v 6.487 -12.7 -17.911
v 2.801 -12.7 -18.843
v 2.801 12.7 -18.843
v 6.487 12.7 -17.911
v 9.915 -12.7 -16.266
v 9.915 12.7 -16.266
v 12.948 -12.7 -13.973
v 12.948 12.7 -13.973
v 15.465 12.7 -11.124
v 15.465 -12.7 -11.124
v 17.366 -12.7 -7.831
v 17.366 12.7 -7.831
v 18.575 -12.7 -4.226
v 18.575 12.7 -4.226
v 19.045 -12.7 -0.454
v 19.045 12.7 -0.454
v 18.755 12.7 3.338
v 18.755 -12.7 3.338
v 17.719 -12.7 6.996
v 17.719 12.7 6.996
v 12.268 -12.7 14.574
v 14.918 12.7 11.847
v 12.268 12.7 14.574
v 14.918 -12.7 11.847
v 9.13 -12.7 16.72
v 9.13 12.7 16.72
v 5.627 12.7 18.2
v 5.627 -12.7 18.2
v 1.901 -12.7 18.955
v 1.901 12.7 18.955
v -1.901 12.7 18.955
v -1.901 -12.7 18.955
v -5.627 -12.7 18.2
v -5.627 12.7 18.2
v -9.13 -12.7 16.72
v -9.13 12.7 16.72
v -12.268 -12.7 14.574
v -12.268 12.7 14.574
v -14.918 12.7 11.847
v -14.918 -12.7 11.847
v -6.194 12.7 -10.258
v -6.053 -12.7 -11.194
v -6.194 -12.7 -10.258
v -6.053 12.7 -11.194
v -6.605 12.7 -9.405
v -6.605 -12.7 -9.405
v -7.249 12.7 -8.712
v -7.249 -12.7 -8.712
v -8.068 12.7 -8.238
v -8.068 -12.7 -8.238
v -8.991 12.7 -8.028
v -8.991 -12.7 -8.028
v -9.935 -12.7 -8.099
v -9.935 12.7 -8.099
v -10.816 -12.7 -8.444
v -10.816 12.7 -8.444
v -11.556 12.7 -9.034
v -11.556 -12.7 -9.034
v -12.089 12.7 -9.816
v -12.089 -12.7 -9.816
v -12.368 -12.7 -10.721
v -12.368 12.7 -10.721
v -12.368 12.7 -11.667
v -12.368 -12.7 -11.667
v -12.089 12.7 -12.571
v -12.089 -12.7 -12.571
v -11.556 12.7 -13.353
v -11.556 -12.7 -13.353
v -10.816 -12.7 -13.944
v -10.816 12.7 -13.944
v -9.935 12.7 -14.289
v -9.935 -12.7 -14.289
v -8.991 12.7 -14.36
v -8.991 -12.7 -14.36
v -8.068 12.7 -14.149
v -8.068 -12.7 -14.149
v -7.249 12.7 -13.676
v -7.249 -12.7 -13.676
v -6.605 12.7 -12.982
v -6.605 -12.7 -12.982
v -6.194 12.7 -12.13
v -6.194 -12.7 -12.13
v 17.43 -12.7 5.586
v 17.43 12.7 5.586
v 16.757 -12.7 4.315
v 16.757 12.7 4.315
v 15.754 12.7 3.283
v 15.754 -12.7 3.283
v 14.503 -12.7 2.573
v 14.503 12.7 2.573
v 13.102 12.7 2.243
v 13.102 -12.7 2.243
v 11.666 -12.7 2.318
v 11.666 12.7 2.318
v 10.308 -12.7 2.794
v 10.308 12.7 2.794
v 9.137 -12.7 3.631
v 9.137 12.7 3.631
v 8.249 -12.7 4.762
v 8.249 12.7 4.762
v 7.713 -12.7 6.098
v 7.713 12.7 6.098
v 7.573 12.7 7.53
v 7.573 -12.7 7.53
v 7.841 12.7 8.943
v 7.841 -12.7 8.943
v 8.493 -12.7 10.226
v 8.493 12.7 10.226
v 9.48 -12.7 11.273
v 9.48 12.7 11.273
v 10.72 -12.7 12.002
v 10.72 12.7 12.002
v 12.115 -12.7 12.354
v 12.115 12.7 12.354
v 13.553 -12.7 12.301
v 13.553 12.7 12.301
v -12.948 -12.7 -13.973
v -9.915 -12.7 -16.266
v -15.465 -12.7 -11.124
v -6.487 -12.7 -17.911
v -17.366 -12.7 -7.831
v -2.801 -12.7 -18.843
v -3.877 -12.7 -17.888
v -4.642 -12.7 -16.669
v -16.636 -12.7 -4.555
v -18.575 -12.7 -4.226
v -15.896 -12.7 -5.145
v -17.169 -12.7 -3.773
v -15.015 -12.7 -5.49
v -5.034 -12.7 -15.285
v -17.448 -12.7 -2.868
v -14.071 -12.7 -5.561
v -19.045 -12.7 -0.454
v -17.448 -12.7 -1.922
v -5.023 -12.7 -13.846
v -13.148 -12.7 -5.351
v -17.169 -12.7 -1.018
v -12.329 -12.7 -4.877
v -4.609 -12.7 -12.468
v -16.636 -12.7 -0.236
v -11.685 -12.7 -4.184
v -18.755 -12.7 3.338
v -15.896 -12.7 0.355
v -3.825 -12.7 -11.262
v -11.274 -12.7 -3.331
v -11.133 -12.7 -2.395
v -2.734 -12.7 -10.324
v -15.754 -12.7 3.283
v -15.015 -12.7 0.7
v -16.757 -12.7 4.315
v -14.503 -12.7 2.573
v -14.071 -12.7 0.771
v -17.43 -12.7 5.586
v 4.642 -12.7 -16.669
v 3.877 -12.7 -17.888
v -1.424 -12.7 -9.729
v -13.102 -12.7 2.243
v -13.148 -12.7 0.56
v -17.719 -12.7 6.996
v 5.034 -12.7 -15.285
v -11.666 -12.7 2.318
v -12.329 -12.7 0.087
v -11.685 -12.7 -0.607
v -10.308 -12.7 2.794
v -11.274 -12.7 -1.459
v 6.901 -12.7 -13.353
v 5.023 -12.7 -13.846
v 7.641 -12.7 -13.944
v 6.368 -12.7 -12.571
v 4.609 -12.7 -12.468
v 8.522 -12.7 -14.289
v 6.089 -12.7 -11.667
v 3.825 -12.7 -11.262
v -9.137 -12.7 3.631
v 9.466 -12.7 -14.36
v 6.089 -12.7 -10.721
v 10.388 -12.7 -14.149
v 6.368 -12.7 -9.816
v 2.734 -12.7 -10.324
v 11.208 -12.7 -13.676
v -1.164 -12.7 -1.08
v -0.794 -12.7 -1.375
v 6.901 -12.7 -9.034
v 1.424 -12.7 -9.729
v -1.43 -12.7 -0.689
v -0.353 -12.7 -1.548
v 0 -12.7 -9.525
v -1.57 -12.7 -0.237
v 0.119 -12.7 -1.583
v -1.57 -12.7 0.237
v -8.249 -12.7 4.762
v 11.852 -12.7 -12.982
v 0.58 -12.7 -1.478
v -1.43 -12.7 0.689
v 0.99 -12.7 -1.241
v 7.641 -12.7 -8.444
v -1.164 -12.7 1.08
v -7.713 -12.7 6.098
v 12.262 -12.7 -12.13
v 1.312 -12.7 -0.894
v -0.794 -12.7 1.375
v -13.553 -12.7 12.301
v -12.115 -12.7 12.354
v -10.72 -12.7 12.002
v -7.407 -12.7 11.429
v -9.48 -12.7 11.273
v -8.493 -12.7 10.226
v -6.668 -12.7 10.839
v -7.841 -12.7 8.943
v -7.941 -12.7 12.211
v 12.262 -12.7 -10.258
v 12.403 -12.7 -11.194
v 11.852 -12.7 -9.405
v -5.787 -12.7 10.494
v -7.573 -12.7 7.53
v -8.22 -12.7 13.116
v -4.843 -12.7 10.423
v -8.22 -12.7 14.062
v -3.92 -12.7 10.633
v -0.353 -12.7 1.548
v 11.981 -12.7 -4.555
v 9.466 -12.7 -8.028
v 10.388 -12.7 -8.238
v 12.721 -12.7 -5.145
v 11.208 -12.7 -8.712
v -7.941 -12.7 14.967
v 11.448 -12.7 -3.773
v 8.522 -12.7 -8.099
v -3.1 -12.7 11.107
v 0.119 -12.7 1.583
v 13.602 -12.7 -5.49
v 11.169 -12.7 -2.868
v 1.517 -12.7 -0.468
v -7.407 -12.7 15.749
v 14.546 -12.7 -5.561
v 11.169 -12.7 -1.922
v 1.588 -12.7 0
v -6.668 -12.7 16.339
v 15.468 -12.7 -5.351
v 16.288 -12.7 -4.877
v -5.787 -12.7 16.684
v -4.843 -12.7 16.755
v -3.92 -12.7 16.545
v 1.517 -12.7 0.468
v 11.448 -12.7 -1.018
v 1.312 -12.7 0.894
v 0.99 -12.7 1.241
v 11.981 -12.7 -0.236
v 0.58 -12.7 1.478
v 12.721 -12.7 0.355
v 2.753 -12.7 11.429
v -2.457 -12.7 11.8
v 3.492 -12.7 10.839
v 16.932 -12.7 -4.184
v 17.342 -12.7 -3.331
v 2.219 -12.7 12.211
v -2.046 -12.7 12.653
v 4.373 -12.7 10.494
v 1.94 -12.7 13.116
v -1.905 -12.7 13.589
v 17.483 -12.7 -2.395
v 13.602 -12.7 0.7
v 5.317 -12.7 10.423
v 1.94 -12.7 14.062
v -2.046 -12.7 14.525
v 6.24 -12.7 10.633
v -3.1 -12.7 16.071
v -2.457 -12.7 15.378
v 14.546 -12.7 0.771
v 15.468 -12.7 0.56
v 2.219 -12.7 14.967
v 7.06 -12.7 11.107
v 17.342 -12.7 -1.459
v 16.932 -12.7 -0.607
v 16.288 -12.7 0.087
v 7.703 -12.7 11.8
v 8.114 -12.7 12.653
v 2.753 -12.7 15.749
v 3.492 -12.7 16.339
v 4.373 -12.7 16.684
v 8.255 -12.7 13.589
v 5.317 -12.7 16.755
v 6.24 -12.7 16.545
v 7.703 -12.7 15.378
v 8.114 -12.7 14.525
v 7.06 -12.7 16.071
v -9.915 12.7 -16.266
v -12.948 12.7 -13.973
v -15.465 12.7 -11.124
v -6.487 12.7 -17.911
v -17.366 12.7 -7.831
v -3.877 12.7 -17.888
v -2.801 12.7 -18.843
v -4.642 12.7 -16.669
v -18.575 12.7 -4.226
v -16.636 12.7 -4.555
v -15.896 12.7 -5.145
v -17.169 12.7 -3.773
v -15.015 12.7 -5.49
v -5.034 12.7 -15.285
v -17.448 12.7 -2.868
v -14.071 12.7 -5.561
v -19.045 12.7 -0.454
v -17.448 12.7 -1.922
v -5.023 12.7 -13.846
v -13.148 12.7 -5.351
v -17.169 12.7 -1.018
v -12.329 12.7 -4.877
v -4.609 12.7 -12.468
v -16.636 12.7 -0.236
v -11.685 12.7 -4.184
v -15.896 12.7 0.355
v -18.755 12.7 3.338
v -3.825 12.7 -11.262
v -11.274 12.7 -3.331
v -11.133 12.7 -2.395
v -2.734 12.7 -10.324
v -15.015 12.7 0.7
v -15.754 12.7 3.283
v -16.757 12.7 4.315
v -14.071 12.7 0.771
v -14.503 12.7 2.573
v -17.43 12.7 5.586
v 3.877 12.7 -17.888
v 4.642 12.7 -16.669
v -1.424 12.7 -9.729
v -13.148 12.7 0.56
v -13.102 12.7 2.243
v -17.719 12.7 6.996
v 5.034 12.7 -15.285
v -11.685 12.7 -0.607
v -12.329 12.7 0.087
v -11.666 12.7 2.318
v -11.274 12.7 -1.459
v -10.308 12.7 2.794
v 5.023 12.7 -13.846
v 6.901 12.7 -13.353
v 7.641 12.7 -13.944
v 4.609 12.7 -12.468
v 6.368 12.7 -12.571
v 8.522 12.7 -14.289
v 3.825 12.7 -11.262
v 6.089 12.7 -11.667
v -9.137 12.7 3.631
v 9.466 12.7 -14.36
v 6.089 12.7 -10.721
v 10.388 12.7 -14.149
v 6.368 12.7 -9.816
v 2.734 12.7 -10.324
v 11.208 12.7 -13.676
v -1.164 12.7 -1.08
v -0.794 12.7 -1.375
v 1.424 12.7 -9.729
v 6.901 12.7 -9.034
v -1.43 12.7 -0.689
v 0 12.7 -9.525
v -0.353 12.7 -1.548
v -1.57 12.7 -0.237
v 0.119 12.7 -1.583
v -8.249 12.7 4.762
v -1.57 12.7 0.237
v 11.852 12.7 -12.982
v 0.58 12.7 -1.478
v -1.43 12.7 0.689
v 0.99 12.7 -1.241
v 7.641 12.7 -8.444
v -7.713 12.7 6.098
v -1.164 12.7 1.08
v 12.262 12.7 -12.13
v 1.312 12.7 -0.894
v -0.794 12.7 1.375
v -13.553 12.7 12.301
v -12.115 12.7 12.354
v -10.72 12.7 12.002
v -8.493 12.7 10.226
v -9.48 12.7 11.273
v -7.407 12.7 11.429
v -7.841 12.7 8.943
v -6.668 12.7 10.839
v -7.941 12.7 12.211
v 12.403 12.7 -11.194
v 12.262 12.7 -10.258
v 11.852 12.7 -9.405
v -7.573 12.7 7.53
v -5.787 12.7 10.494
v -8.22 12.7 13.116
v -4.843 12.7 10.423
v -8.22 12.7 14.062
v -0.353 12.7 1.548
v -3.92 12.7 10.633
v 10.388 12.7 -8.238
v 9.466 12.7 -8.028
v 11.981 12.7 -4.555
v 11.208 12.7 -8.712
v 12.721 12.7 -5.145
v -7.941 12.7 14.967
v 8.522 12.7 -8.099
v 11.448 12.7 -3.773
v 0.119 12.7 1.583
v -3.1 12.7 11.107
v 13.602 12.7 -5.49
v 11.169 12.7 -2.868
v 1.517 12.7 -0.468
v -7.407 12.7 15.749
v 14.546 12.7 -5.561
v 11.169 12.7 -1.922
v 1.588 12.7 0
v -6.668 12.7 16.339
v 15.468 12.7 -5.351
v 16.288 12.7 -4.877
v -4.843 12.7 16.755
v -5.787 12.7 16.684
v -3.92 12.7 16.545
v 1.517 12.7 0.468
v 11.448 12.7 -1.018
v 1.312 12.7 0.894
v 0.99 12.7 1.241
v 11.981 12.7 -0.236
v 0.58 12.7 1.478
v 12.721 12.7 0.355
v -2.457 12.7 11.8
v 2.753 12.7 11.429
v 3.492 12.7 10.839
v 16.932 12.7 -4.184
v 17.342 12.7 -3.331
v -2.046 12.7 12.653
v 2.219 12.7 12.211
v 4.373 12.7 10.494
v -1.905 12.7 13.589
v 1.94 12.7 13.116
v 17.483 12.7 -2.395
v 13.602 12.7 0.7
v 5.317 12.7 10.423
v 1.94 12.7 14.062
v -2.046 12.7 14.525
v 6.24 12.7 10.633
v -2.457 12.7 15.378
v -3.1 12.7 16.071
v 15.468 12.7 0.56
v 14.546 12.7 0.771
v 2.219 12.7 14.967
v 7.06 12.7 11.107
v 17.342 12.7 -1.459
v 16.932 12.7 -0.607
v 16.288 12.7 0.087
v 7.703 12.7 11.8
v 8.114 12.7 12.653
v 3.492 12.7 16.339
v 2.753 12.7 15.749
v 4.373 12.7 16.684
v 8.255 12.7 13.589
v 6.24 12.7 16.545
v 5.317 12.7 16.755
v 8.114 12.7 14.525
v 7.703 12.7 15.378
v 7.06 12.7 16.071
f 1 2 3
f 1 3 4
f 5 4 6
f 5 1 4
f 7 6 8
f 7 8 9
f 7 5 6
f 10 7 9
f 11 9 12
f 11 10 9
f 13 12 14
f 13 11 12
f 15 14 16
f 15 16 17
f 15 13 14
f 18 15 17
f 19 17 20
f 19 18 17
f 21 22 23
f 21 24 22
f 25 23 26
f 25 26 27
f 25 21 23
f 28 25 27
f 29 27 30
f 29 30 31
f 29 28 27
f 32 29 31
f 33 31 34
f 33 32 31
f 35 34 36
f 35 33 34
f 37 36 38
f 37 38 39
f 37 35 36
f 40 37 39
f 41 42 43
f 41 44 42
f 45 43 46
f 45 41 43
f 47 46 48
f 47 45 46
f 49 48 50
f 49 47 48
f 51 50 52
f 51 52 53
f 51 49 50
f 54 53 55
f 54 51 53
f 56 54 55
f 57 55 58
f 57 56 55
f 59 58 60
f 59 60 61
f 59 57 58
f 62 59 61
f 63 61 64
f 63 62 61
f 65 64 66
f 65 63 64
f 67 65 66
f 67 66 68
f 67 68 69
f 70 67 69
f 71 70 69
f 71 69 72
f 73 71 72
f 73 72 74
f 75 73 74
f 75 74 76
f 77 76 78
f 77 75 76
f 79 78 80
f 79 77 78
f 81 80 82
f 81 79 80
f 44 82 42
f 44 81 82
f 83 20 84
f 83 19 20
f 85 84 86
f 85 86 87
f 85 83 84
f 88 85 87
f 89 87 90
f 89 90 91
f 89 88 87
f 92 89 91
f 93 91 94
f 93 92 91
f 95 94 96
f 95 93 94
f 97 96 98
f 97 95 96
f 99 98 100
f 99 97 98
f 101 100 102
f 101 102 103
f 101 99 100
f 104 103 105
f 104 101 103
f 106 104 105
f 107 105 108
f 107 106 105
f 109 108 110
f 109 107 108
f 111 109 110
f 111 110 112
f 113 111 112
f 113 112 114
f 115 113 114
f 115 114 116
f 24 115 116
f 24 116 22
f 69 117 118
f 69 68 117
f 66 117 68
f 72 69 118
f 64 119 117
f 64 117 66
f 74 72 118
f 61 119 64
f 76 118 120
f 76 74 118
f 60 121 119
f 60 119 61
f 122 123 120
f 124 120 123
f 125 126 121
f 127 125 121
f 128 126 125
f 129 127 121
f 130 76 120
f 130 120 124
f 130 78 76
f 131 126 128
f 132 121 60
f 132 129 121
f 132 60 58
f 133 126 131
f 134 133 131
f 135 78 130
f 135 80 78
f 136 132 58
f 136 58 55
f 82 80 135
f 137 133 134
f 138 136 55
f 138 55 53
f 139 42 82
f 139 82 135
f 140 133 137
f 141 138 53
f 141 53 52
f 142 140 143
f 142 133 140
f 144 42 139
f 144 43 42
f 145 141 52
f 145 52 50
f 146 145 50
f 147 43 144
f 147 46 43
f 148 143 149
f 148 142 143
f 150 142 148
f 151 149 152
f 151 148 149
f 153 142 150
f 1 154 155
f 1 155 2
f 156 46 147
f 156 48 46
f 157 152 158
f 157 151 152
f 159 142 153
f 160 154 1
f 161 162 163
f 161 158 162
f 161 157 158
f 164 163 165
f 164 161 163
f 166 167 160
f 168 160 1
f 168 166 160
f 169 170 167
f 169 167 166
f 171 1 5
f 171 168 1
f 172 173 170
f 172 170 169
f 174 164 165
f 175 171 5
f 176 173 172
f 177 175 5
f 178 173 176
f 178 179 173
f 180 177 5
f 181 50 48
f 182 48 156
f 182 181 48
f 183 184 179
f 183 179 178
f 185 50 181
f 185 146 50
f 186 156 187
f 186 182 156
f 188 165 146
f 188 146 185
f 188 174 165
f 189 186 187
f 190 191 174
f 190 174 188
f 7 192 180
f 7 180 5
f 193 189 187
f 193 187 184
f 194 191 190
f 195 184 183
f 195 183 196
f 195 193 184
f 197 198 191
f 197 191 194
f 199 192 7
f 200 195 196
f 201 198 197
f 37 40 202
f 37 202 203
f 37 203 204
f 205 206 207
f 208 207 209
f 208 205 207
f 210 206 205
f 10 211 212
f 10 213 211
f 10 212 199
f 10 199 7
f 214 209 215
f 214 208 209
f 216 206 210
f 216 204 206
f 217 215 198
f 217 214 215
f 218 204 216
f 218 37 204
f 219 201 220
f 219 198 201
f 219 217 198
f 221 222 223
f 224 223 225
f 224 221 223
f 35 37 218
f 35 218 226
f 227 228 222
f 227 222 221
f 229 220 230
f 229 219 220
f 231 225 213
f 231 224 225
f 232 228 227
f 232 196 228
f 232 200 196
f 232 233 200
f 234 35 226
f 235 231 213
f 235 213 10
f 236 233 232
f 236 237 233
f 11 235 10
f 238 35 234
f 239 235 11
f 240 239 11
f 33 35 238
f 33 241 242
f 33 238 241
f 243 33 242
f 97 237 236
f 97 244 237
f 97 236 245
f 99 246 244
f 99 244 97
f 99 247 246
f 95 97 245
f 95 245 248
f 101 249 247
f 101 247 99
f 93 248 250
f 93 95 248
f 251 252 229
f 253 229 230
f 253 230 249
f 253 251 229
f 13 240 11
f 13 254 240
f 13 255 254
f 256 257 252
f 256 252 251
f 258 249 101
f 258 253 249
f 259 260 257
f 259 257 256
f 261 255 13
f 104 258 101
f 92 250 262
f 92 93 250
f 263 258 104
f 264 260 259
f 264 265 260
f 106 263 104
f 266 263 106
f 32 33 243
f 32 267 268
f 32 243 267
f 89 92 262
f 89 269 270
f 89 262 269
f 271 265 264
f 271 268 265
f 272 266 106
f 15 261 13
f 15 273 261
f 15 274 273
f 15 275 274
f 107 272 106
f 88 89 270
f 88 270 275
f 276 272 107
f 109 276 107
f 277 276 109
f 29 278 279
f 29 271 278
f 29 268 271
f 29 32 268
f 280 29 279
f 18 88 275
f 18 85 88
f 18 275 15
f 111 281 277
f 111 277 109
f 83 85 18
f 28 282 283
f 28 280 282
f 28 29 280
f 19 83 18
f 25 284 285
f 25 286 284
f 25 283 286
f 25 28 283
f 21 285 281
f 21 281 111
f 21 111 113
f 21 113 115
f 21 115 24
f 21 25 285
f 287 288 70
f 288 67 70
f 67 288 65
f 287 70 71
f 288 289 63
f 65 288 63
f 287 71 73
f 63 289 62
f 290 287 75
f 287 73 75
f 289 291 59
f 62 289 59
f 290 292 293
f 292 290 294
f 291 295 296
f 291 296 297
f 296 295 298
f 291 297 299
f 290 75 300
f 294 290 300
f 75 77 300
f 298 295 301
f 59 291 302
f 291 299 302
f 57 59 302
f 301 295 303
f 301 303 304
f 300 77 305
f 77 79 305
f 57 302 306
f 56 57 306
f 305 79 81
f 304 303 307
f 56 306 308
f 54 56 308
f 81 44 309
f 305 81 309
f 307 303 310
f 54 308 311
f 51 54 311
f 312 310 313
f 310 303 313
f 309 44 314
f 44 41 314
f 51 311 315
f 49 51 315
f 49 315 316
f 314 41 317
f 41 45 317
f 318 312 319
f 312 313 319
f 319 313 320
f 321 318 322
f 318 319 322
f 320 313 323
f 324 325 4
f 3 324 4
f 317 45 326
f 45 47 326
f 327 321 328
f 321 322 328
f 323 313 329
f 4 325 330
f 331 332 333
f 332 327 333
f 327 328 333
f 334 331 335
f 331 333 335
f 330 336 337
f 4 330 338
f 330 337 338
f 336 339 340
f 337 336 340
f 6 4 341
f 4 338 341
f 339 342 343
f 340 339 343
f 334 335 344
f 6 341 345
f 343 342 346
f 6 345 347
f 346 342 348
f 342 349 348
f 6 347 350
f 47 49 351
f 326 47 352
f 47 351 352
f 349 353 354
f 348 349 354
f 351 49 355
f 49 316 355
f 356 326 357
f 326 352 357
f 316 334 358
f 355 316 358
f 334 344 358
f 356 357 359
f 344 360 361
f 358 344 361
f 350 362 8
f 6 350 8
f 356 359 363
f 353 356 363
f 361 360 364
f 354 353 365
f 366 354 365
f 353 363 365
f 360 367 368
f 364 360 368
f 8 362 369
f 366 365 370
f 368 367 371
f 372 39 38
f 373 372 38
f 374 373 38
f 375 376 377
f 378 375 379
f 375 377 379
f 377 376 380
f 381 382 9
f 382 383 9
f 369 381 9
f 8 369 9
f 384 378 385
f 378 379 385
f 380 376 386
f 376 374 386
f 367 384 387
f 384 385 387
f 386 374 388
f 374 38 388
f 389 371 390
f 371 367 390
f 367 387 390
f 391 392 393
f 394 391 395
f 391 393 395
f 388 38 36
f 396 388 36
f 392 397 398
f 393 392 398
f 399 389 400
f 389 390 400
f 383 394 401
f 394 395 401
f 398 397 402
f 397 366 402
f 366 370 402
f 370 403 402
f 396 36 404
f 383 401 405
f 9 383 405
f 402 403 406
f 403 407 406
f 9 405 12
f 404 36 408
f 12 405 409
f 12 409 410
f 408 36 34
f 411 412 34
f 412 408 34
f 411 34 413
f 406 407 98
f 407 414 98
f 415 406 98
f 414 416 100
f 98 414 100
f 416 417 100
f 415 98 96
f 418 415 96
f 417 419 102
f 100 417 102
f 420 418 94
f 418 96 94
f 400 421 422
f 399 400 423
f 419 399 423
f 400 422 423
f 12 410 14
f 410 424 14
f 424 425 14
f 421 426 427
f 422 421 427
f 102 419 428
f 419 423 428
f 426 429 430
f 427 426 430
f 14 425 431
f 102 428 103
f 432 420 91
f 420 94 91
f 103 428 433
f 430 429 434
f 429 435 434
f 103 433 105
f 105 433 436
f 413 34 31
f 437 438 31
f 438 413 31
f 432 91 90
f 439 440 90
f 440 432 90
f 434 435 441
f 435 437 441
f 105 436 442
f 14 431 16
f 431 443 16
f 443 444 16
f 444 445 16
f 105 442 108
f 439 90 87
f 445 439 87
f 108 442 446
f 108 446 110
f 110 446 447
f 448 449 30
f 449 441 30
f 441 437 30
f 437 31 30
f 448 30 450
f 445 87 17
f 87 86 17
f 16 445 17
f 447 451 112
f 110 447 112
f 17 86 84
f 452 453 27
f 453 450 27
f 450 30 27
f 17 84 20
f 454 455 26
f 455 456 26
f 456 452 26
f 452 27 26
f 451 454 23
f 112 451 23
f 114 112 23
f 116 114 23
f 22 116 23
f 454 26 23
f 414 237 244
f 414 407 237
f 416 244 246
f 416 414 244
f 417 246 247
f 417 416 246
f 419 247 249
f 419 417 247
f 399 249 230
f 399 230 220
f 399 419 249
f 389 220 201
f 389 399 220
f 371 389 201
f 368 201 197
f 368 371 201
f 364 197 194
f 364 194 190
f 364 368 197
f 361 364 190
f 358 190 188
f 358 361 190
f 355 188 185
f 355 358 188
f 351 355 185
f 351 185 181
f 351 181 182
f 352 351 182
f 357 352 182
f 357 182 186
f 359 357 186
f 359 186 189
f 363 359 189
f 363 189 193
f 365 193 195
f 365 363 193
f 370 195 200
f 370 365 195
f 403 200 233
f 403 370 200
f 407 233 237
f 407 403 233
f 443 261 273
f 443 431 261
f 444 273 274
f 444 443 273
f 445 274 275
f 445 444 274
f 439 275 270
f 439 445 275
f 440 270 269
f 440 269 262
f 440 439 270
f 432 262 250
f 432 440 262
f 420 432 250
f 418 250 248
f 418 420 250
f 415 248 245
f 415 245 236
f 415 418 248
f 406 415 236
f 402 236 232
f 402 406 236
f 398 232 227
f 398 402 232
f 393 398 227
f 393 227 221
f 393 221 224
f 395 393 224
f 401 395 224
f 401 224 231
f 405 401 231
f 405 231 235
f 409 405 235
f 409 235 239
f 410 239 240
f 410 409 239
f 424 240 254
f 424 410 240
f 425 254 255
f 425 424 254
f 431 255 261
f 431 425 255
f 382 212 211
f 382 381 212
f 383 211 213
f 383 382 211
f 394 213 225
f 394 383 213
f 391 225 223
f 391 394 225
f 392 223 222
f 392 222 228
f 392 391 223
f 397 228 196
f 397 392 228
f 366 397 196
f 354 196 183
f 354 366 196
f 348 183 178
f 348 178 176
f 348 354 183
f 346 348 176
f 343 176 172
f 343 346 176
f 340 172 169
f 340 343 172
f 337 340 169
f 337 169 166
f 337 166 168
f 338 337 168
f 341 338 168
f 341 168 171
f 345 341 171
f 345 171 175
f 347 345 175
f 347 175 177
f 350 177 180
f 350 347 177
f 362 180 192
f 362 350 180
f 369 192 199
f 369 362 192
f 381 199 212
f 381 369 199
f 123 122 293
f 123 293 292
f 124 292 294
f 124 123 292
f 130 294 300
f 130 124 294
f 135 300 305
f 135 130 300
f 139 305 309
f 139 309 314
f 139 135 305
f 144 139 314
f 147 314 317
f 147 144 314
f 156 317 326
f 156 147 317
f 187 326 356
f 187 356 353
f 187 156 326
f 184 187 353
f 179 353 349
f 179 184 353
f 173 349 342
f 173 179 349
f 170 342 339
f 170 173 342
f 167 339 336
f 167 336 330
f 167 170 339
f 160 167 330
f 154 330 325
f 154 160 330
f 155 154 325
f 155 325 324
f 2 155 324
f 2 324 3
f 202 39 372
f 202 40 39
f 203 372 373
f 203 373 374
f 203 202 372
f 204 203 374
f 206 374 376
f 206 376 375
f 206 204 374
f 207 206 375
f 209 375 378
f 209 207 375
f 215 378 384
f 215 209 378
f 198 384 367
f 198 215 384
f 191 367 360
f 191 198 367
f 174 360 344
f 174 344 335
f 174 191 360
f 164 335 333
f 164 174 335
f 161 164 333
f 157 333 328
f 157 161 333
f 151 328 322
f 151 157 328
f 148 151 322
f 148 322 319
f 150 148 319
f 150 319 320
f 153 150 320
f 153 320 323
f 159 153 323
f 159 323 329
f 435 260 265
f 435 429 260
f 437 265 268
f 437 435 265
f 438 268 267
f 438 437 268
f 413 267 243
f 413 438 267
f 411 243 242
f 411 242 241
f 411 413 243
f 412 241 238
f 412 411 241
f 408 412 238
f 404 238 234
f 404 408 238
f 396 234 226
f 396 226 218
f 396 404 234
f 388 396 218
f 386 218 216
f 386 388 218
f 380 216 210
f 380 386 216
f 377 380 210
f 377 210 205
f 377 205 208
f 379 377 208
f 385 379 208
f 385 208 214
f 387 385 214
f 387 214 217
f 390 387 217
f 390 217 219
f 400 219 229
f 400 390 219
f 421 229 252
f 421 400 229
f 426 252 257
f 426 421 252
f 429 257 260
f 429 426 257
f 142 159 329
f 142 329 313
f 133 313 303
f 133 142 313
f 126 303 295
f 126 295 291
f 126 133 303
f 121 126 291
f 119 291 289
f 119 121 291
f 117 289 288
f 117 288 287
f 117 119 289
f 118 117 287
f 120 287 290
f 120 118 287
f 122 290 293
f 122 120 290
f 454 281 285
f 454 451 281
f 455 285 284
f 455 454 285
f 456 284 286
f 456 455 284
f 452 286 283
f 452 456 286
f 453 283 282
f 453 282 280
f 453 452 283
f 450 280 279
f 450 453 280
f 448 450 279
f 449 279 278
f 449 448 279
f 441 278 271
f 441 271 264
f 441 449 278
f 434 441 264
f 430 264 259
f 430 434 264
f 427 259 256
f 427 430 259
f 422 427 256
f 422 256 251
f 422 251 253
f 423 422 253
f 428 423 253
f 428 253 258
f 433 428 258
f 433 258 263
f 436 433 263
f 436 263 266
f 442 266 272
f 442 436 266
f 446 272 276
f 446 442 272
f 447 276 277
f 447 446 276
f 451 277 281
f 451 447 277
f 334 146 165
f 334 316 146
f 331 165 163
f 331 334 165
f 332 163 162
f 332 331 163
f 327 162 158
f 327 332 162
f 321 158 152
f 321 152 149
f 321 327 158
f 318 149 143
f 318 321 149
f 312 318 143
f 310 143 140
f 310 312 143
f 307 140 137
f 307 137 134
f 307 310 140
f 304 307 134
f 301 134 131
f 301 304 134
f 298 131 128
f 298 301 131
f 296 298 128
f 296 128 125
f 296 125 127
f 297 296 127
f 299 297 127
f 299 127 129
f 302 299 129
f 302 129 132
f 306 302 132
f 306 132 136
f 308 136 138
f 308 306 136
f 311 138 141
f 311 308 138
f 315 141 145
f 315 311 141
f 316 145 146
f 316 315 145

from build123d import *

# Parameters (mm, degrees)
F0_R     = 3.175
F0_R_2   = 1.5875
F1_DEPTH = 12.7


with BuildPart() as f1:
    # F0 (on Front) → F1 (new body, symmetric)
    with BuildSketch(Plane.XZ):
        with BuildLine():
            ThreePointArc((-14.9178970331, 11.8473139618), (-8.248891971, 4.7625), (-17.7190233741, 6.9956208208))
            ThreePointArc((-17.7190233741, 6.9956208208), (-16.4977839421, -9.525), (-2.801126341, -18.8429347826))
            ThreePointArc((-2.801126341, -18.8429347826), (0, -9.525), (2.801126341, -18.8429347826))
            ThreePointArc((2.801126341, -18.8429347826), (16.4977839421, -9.525), (17.7190233741, 6.9956208208))
            ThreePointArc((17.7190233741, 6.9956208208), (8.248891971, 4.7625), (14.9178970331, 11.8473139618))
            ThreePointArc((14.9178970331, 11.8473139618), (0, 19.05), (-14.9178970331, 11.8473139618))
        make_face()
        with Locations((-9.228419212, -11.1939090512)):
            Circle(F0_R, mode=Mode.SUBTRACT)
        with Locations((-14.308419212, -2.3950909488)):
            Circle(F0_R, mode=Mode.SUBTRACT)
        with Locations((9.228419212, -11.1939090512)):
            Circle(F0_R, mode=Mode.SUBTRACT)
        Circle(F0_R_2, mode=Mode.SUBTRACT)
        with Locations((14.308419212, -2.3950909488)):
            Circle(F0_R, mode=Mode.SUBTRACT)
        with Locations((-5.08, 13.589)):
            Circle(F0_R, mode=Mode.SUBTRACT)
        with Locations((5.08, 13.589)):
            Circle(F0_R, mode=Mode.SUBTRACT)
    extrude(amount=F1_DEPTH, both=True)


solid = f1.part
